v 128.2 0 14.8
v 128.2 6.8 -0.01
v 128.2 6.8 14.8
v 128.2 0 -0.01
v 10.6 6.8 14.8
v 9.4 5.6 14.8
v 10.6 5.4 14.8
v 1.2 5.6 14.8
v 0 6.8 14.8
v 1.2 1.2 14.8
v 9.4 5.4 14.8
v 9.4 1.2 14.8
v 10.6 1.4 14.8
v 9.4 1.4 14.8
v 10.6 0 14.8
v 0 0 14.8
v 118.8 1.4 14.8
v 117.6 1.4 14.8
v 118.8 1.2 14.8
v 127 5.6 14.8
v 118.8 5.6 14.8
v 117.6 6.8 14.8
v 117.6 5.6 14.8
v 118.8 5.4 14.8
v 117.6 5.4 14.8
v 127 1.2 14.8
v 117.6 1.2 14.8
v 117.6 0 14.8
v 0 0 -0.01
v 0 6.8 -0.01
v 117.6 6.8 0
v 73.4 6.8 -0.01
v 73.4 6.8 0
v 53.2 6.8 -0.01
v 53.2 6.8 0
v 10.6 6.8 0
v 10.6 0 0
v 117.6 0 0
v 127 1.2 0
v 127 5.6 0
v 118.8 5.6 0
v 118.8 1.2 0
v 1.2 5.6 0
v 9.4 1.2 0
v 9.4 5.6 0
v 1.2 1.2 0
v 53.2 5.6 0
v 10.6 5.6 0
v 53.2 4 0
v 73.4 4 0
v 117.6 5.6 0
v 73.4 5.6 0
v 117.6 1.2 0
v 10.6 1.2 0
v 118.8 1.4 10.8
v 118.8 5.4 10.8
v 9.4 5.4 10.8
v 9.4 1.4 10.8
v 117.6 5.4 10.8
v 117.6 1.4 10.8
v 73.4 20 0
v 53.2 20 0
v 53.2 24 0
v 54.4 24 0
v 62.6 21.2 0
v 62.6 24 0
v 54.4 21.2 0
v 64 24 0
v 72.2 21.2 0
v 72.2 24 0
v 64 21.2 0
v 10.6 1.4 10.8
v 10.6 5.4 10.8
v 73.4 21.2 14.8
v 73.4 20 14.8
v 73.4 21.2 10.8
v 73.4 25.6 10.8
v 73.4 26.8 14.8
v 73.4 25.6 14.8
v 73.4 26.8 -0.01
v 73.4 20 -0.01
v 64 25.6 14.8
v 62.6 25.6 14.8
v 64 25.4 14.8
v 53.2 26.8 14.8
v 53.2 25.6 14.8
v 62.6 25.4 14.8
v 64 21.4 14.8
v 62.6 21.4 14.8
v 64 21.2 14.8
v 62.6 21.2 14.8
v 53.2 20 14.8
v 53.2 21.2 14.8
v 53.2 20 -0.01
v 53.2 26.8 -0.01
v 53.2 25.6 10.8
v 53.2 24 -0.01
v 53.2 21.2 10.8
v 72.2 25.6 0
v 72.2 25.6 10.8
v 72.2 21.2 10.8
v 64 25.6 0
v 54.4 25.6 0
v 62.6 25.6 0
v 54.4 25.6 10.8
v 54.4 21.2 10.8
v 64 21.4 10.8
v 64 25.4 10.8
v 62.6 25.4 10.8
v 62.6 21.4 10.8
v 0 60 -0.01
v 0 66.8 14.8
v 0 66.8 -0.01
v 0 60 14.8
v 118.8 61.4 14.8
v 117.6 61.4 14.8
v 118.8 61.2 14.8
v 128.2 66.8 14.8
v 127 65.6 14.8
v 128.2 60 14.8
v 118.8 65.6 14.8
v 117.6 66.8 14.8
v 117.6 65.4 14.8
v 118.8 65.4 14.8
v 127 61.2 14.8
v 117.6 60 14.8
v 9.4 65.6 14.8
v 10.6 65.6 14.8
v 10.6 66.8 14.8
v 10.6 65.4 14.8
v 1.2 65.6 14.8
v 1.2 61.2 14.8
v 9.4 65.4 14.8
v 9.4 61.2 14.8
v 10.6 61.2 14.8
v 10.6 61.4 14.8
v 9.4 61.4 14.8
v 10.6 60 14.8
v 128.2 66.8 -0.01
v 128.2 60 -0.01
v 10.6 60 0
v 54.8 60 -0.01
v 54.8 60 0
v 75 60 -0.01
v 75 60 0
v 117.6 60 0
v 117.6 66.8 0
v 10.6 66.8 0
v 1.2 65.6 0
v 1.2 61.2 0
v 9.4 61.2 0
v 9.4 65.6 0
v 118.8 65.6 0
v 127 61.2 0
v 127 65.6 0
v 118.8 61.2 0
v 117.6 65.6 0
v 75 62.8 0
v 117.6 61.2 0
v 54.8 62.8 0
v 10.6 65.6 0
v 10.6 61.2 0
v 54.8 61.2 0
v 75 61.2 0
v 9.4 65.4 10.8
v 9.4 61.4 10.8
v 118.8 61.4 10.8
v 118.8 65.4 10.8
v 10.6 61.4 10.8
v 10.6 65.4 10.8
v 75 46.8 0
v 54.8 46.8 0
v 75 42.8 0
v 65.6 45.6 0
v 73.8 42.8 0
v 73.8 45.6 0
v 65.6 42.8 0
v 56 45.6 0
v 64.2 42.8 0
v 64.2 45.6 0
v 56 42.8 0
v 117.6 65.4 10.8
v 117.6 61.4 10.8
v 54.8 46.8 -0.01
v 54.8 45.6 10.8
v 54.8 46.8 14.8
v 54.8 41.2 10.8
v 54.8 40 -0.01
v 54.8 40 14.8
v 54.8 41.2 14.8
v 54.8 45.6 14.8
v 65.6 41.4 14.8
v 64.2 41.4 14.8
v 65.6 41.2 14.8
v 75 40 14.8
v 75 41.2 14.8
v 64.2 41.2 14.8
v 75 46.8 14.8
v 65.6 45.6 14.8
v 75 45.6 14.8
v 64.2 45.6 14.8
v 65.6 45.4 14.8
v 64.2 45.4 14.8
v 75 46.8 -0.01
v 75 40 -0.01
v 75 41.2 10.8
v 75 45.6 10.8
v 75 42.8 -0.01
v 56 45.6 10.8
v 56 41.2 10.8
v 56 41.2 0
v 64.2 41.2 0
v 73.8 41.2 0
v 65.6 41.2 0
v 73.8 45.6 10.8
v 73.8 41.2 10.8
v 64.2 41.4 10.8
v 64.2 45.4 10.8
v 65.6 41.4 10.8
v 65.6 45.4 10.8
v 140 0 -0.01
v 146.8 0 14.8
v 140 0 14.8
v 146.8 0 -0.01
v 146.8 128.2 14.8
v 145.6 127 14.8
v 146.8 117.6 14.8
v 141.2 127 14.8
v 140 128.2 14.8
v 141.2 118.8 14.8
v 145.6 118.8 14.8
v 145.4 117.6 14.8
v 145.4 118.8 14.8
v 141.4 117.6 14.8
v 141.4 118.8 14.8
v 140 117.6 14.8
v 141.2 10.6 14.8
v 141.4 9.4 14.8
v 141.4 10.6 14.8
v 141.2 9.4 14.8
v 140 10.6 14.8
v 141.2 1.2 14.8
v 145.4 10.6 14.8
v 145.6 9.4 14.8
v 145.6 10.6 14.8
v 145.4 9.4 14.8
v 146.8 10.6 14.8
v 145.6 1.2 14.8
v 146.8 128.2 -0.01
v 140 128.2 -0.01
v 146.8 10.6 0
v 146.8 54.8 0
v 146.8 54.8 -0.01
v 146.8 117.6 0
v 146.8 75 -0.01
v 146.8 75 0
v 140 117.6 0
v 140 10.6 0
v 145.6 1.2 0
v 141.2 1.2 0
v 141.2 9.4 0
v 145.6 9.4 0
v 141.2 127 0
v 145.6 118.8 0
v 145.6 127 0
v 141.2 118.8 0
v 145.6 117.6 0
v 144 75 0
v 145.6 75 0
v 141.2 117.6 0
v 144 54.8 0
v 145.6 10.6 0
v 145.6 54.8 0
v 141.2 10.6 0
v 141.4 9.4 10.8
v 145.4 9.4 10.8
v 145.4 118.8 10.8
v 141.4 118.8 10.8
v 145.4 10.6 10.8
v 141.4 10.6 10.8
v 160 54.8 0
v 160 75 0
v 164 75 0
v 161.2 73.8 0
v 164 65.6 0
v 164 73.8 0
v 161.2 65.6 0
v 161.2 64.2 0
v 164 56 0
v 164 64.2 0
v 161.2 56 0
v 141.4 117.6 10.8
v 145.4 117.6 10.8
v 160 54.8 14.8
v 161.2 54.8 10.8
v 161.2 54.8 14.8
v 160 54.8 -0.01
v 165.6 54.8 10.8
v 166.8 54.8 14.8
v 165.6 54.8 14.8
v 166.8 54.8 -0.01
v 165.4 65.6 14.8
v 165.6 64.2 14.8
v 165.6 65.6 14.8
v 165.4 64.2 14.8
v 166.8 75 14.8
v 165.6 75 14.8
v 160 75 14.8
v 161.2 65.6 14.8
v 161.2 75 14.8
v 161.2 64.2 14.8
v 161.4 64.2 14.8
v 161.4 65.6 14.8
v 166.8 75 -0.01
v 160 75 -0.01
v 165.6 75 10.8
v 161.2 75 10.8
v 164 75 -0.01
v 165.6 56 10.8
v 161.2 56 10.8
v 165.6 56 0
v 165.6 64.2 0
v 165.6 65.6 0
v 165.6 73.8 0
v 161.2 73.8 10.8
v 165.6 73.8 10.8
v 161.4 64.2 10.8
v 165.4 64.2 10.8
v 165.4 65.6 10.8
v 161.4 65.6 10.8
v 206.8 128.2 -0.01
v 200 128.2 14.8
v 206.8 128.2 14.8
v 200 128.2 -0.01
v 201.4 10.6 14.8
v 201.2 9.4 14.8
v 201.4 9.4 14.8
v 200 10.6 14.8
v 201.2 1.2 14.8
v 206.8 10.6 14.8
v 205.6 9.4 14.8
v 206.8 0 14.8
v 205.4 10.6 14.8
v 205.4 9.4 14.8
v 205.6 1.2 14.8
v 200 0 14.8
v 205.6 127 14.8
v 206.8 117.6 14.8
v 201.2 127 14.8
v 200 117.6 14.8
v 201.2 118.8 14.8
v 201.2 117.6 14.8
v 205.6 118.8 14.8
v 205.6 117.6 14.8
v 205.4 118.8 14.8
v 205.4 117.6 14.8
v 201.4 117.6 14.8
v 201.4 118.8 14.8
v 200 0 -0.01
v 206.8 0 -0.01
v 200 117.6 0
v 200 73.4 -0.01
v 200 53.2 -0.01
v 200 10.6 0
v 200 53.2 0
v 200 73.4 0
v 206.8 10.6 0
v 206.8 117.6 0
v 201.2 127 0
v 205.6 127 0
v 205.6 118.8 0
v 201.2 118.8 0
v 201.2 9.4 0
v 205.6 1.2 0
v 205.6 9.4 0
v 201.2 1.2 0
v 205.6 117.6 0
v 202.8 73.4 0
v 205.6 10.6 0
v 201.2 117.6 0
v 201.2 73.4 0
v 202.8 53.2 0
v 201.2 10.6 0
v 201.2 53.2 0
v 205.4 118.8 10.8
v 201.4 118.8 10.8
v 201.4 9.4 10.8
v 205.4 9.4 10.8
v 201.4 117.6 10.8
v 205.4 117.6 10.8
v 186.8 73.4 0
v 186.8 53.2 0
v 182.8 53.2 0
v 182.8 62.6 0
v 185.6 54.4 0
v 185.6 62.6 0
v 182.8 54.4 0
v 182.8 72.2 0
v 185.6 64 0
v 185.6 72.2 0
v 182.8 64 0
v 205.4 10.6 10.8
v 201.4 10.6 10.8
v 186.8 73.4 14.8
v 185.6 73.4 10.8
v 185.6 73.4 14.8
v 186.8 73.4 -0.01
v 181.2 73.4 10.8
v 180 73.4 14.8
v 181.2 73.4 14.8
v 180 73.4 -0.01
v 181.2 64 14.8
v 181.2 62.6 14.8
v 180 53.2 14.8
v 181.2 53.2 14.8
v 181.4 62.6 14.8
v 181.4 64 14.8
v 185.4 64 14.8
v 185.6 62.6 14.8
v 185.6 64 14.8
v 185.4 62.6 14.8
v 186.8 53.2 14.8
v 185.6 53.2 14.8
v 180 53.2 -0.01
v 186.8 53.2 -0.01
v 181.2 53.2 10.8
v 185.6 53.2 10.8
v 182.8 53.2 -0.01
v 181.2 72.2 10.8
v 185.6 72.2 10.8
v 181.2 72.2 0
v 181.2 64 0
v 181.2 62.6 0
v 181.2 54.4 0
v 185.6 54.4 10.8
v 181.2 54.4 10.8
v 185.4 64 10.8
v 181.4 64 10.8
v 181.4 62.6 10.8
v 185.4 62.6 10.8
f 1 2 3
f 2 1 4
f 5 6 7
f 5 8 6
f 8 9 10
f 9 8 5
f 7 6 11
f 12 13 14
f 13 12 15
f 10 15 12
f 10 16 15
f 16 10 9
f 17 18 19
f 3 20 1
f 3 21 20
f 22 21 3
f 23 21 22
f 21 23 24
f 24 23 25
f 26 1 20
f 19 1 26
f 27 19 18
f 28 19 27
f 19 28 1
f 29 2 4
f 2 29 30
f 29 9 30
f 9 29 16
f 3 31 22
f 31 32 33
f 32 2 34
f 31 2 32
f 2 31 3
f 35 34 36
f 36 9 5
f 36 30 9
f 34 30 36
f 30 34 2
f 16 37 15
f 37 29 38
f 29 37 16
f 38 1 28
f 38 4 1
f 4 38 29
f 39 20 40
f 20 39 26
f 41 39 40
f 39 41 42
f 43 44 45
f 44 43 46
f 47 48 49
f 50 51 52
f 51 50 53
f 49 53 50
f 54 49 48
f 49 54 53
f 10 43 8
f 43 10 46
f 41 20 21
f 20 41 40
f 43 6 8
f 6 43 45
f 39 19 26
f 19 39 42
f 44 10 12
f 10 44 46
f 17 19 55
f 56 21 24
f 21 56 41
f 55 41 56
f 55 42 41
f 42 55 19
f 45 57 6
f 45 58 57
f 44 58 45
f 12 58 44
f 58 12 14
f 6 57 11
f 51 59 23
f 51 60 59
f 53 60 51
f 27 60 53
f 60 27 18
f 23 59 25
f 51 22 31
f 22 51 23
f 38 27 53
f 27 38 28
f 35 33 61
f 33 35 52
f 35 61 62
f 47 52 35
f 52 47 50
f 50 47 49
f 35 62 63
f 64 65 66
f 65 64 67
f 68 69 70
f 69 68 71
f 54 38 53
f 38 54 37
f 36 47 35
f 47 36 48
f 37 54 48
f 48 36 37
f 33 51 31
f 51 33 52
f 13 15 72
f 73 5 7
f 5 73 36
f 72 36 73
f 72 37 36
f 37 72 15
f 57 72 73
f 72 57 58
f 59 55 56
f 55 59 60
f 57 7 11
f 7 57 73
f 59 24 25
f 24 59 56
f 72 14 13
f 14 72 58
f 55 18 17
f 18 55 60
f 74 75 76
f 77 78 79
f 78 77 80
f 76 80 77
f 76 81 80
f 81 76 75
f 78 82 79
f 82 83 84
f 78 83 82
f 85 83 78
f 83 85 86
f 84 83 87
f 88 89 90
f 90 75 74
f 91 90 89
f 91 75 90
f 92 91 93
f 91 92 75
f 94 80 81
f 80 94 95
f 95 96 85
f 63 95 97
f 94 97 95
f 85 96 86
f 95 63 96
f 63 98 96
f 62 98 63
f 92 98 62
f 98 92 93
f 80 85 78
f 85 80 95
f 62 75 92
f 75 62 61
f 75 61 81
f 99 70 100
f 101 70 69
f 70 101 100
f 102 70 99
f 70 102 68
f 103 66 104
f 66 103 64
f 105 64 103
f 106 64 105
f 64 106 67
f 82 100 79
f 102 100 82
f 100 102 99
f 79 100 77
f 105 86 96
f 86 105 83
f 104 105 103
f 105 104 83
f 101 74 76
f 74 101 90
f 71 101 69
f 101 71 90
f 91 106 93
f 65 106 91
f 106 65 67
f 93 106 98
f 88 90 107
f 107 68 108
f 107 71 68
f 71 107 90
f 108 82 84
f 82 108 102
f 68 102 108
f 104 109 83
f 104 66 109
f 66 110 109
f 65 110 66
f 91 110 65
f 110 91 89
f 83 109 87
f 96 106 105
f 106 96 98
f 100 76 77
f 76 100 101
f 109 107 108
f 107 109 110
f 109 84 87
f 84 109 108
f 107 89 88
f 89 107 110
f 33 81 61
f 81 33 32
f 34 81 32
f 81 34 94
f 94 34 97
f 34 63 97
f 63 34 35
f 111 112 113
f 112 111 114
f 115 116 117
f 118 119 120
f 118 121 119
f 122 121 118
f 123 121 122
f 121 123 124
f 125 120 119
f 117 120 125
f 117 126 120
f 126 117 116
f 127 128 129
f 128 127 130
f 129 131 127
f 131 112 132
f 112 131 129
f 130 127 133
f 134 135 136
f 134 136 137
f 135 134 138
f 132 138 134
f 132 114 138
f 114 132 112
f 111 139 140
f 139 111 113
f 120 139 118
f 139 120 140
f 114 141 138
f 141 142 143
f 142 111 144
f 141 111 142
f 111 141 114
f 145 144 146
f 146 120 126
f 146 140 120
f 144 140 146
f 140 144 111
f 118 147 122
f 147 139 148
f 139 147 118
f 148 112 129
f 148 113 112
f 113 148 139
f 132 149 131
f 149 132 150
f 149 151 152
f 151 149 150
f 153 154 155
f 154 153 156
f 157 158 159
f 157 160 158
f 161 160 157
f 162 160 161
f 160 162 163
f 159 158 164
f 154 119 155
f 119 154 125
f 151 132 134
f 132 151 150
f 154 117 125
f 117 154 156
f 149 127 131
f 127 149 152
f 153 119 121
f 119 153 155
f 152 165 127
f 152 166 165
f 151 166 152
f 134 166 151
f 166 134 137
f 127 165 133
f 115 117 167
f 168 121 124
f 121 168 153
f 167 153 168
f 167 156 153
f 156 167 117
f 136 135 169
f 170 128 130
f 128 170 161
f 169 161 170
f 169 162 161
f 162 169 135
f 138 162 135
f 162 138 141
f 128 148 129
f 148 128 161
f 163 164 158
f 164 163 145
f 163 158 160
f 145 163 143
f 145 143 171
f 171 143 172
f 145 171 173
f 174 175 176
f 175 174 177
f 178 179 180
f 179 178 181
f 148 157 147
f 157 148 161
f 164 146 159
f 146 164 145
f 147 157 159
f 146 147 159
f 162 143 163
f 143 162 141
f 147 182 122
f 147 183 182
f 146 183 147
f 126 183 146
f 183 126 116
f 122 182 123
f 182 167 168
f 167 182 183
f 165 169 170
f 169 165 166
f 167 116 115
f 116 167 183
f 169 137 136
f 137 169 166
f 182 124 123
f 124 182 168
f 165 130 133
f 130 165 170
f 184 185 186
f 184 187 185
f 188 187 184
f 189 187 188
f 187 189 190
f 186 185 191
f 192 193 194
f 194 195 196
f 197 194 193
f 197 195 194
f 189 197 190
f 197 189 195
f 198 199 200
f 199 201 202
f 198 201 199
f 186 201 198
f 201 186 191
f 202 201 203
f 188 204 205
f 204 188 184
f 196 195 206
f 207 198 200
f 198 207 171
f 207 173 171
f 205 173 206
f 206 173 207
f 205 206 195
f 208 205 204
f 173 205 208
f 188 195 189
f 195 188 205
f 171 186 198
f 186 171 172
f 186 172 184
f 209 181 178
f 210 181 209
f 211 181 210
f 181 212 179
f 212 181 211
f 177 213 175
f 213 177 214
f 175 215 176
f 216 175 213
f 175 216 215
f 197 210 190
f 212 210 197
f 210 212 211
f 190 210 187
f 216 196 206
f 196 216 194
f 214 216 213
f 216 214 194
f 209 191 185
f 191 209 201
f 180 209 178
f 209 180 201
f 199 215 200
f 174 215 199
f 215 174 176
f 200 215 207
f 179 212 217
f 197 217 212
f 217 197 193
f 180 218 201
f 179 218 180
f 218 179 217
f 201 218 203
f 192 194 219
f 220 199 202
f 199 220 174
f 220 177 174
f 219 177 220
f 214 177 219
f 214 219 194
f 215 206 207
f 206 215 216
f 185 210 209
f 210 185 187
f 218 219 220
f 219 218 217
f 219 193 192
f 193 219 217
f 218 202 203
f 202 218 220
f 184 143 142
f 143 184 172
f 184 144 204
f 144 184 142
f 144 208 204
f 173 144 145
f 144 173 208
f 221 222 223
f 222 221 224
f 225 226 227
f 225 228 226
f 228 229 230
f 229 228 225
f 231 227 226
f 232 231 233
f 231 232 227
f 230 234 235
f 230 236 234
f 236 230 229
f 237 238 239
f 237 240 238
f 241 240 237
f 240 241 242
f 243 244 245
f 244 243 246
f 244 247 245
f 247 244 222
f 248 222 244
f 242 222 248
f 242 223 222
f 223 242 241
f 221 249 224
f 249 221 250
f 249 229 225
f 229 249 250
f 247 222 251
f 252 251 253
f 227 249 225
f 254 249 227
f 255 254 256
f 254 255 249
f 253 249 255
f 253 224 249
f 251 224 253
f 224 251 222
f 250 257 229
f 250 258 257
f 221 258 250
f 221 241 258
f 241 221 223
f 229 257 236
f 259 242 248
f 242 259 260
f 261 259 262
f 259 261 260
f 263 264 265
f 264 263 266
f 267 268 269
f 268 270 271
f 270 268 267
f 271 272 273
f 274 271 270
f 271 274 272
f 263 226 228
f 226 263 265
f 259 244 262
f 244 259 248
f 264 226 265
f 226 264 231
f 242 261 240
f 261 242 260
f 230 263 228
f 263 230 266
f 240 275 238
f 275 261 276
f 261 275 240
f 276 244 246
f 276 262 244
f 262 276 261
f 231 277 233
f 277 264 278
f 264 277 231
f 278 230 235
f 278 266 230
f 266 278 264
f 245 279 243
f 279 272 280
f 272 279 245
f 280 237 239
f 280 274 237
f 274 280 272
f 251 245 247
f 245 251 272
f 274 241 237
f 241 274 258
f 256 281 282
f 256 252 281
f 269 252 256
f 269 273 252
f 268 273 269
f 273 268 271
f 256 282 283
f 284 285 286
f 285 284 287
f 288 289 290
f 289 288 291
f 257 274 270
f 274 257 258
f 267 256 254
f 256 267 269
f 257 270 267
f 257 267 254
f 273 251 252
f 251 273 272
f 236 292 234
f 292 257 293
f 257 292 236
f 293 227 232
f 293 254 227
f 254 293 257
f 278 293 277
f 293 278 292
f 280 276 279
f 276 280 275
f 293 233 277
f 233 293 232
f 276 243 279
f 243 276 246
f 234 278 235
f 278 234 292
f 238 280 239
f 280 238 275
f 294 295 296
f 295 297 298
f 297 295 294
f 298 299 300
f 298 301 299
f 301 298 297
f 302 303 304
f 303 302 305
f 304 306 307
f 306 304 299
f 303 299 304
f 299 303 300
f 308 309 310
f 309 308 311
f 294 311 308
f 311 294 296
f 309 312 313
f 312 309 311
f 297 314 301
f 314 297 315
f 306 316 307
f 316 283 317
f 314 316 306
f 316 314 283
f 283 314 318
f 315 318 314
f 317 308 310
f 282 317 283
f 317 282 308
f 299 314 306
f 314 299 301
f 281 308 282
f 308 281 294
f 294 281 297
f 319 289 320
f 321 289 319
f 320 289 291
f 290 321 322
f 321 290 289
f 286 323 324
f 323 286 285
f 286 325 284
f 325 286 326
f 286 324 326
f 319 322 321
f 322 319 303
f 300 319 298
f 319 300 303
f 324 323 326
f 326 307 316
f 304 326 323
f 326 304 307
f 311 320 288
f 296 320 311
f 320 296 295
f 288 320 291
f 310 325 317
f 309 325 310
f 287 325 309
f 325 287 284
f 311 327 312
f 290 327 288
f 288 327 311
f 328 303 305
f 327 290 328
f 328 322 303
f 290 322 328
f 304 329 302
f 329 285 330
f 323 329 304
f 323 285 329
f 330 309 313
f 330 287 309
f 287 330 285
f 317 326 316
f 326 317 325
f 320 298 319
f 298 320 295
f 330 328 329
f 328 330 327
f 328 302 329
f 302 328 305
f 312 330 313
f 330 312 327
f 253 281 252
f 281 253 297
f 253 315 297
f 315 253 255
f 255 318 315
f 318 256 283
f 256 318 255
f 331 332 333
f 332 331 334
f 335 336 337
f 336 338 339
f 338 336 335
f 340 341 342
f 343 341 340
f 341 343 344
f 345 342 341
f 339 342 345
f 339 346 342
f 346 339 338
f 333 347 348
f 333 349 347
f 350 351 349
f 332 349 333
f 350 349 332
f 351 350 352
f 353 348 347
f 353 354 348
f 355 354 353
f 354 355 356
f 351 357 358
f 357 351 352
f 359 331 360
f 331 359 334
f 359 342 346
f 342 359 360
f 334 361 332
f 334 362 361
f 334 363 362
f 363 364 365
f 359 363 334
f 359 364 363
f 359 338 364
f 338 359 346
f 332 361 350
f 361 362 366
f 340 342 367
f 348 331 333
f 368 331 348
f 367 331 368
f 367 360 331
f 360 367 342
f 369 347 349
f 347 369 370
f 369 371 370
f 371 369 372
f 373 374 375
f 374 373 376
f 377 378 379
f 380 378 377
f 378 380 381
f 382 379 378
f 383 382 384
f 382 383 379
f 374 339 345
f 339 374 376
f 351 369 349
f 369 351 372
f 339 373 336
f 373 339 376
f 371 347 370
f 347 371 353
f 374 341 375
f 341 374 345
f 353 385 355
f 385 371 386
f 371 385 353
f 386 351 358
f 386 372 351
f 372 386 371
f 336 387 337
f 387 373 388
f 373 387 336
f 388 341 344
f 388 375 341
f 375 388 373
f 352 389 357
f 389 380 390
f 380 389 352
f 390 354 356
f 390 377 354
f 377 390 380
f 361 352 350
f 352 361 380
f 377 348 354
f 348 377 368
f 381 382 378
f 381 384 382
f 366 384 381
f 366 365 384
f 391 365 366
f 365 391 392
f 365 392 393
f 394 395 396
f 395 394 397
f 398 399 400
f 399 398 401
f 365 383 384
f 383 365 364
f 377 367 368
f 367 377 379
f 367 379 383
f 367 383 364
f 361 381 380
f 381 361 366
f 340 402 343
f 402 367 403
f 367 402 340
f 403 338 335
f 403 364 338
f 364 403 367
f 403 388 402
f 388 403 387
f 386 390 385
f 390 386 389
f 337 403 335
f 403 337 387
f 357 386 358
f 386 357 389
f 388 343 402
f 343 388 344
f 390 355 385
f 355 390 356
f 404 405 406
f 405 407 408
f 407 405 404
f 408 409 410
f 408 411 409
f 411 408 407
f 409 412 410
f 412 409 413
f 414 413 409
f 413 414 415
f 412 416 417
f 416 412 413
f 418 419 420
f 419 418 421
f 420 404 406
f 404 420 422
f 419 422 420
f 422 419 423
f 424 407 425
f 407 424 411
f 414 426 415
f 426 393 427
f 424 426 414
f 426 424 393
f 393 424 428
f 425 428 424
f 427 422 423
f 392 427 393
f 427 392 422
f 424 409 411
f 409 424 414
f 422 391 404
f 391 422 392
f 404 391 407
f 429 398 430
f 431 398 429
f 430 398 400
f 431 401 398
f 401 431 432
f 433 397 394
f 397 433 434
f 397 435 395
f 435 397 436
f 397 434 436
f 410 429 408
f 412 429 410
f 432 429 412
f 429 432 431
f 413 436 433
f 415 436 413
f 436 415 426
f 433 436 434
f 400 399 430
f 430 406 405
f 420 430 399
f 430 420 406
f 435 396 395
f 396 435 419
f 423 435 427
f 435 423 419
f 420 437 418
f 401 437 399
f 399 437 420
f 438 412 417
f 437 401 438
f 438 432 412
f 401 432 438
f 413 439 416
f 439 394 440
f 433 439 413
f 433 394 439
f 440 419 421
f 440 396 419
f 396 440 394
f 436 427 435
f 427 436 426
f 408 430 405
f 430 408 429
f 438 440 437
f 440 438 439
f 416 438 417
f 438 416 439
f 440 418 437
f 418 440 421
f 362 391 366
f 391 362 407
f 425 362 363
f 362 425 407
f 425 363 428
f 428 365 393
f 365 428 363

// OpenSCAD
// file: ../../Base/Boxes.scad
// Fischertechnik Box Foundation
// Pre-designed Boxes

use <Constants.scad>

include <PlacementOptions.scad>

box190Width = 190;
box190Depth = 130;
box130Width = 130;
box130Depth = 95;
boxUsageHeight = 33.9;
boxWallThickness = 2.4;
boxBaseThickness = 1.0;

// getBoxWallThickness()
// Gets the wall thickness of a Fischertechnik Box

function getBoxWallThickness() = boxWallThickness;

// Gets the usable height of a fischertechnik box
function getBoxUsageHeight() = boxUsageHeight;

// Gets the thickness of the Fischertechnik box base.
function getBoxBaseThickness() = boxBaseThickness;

// Gets the usable inner space of a Box 190 as an x/y-list
function getBox190Space() = [
    box190Width - 2*getBoxWallThickness(), 
    box190Depth - 2*getBoxWallThickness() ];

// Imports the Fischertechnik empty box 130x190 mm and places it at position 0,0
// 190x130 are the outer sizes, the inner space is slightly smaller. Use getBox190Space() to get the inner sizes.
// This module needs the STL file "Fischertechnik Box 130x190.stl" in the library path.
// The box is positioned that the usable inner space is at the 0,0,0 position. The

module Box190() {
    translate([-getBoxWallThickness(),-getBoxWallThickness(),-getBoxBaseThickness()])
        import("Fischertechnik Box 130x190.stl", convexity=3);
}

// Gets the usable inner space of a Box 130 as an x/y-list
function getBox130Space() = [
    box130Width - 2*getBoxWallThickness(), 
    box130Depth - 2*getBoxWallThickness() ];

// Imports the Fischertechnik empty box 95x130 mm and places it at position 0,0
// 190x130 are the outer sizes, the inner space is slightly smaller. Use getBox190Space() to get the inner sizes.
// This module needs the STL file "Fischertechnik Box 95x130.stl" in the library path.
// The box is positioned that the usable inner space is at the 0,0,0 position. The

module Box130() {
    translate([-getBoxWallThickness(),-getBoxWallThickness(),-getBoxBaseThickness()])
        import("Fischertechnik Box 95x130.stl", convexity=3);
}

// Creates a web at the specified box walls
// corner 0 = LowerLeft, 1 = UpperLeft, 2 = UpperRight, 3 = LowerRight
// side 0 = LeftOfCorner, 1 = RightOfCorner
// distance = Distance in mm from the corner
// box = inner width and depth of the box (default: Box 190)
// webWidth = length of the web (default is 3 mms)
// webThickness = thickness of the web (default is 1 mm)

module BoxWeb(corner, side, distance, box=getBox190Space(), webWidth=3, webThickness=1.0) {
    sink = getBoxWallThickness()/2;

    width = (corner % 2 == 0) ? 
            (side == LeftOfCorner ? webWidth : webThickness) :
            (side == LeftOfCorner ? webThickness : webWidth);

    depth = (corner % 2 == 0) ? 
            (side == RightOfCorner ? webWidth : webThickness) :
            (side == RightOfCorner ? webThickness : webWidth);
    
    xDiff = corner == LowerLeft ? 
                (side == LeftOfCorner ? -sink : distance) :
            (corner == UpperLeft ?                
                (side == LeftOfCorner ? distance : -sink) :
            (corner == UpperRight ?
                (side == LeftOfCorner ? box.x-webWidth+sink : box.x-distance-webThickness) :
                (side == LeftOfCorner ? box.x-distance-webThickness: box.x-webWidth+sink)));

    yDiff = corner == LowerLeft ? 
                (side == RightOfCorner ? -sink : distance) :
            (corner == UpperLeft ?
                (side == RightOfCorner ? box.y-distance : box.y-webWidth+sink) :
            (corner == UpperRight ?
                (side == RightOfCorner ? box.y-webWidth+sink : box.y-distance) :
                (side == RightOfCorner ? distance : -sink)));
    
    translate([xDiff, yDiff, -getExcess()])
        cube([width, depth, boxUsageHeight + 2*getExcess()]);
}
// file: ../../Base/Rotation.scad
// Fischertechnik Box Foundation
// Geometry Helpers Rotation

include <PlacementOptions.scad>

// getRotatedSpace(space, rotation=NoRotation)
// Rotates the space dependent on the specified rotation

function getRotatedSpace(space, rotation=NoRotation) = [
    (rotation == Rotate90 || rotation == Rotate270) ? space.y : space.x,
    (rotation == Rotate90 || rotation == Rotate270) ? space.x : space.y
];

// Rotates the given space around the fixed left lower corner
// space = the space the children needs as width/depth list [width,depth]
// rotation = 0 Rotate0 degrees, 1 Rotate90 degrees, 2 Rotate180 degrees, 3 Rotate270 degrees (equivalent to -90)

module RotateFix(space, rotation=Rotate0) {
    dy = (rotation == Rotate0 || rotation == Rotate270) ? 0 :
        (rotation == Rotate90) ? space.x :
        space.y;
    dx = (rotation < Rotate180) ? 0 :
        (rotation == Rotate180) ? space.x :
        space.y;
    
    translate([dx, dy, 0])
        rotate([0, 0, rotations[rotation]])
            children();
}
// file: ../../Base/Alignment.scad
// Fischertechnik Box Foundation
// Geometry Helpers Alignment

include <PlacementOptions.scad>

// getAlignedX(elementWidth, spaceWidth, align=AlignRight, offset=0)
// Gets the aligned X offset of an element with the given
// width in the given space.
// elementWidth = The width of the element to positon
// spaceWidth = The space where the element should be aligned
// align = 0 AlignLeft, 1 AlignCenter, 2 AlignRight
// offset = an optional offset from the aligned position. When
// aligned left or centered, then positive values are in X direction.
// When aligned right then positive values are in negative X direction.

function getAlignedX(elementWidth, spaceWidth, align=AlignRight, offset=0) =
    (align == AlignLeft) ?
        offset :
        ((align == AlignCenter) ?
        (spaceWidth - elementWidth)/2 + offset :
        spaceWidth - offset - elementWidth);

// getAlignedY(elementDepth, spaceDepth, align=AlignTop, offset=0)
// Gets the aligned Y offset of an element with the given
// depth in the given space.
// elementDepth = The depth of the element to positon
// spaceDepth = The space where the element should be aligned
// align = 0 AlignBottom, 1 AlignCenter, 2 AlignTop
// offset = an optional offset from the aligned position. When
// aligned bottom or centered, then positive values are in Y direction.
// When aligned top then positive values are in negative Y direction.

function getAlignedY(elementDepth, spaceDepth, align=AlignTop, offset=0) =
    (align == AlignBottom) ?
        offset :
        ((align == AlignCenter) ?
        (spaceDepth - elementDepth)/2 + offset :
        spaceDepth - offset - elementDepth);
// file: ../../Base/Constants.scad
// Fischertechnik Box Foundation
// Constants

// Constant values necessary for multiple elements

// Base constants
dividerThickness = 1.2;
excess = 0.01;
fragments = 90;
tolerance = 0.8;

// Gets the thickness of a divider 
function getDividerThickness() = dividerThickness;

// Gets the excess that is used to merge walls into each other
function getExcess() = excess;

// Gets amount of fragments of a cylinder
function getFragments() = fragments;

// Gets the inner tolerance of a frame to each side
function getTolerance() = tolerance;


// Fischertechnik specific constants
axisDiameter = 4;
axisBottomDiameter = axisDiameter + 1;
standardEdgeDistance = 2.5;
standardWebDistance = 11.5;
standardCornerLength = 15;
tubeWallFactor = 1.6;

// Gets axis diameter
function getAxisDiameter() = axisDiameter;

// Gets axis bottom diameter for thicker part at the bottom
function getAxisBottomDiameter() = axisBottomDiameter;

// gets the standard distance to the wall of the box for dockable frames with webs
function getStandardEdgeDistance() = standardEdgeDistance;

// gets the standard distance of each web to the corner of the dockable frame
function getStandardWebDistance() = standardWebDistance;

// gets the standard length of the corner walls of a dockable frame
function getStandardCornerLength() = standardCornerLength;

// gets the wall thickness of a tube.
function getTubeWallThickness() = tubeWallFactor * getDividerThickness();
// file: ../../Base/PlacementOptions.scad
// Fischertechnik Box Foundation
// Placement Options

// Alignment
NoAlign = 0;
AlignLeft = 1;
AlignBottom = 2;
AlignCenter = 3;
AlignRight = 4;
AlignTop = 5;

// Element rotation degree steps
rotations = [0, -90, -180, -270];

// Rotation
NoRotation = 0;
Rotate0 = 0;
Rotate90 = 1;
Rotate180 = 2;
Rotate270 = 3;

// Docking (seen from above)
NoDock = -1;
DockLeft = 0;
DockTop = 1;
DockRight = 2;
DockCorner = 2;
DockBottom = 3;

// Web corners
LowerLeft = 0;
UpperLeft = 1;
UpperRight = 2;
LowerRight = 3;

// Web position relative to corner
LeftOfCorner = 0;
RightOfCorner = 1;
// file: ../../Elements/FrameCrankedAxis.scad
// Fischertechnik Box Library
// Frame for single Cranked Axis
// 31080

use <../Base/Constants.scad>
use <../ModelBase/Simple.scad>
use <../ModelBase/Complex.scad>

length = 125;
holderOffset = 20;

// getFrameCrankedAxisSpace()
// Gets the space (.x, .y) the holder for the cranked axis needs

function getFrameCrankedAxisSpace() = [getFrameAxisSpace(length).x, holderOffset + getFrameAxisSpace(length).y];

// FrameCrankedAxis()
// Holder for a single cranked axis

module FrameCrankedAxis() {
    FrameAxis(length);
    
    holderLength = 17 + 2*getDividerThickness();
    xOffset = ((length + getTolerance()) - holderLength)/2;
    yOffset = getAxisDiameter();

    spaceWidth = holderLength + getTolerance();
    
    translate([xOffset, yOffset, 0]) {
        Space([spaceWidth, holderOffset]);
    }
    
    translate([xOffset, holderOffset, 0]) {
        FrameAxis(holderLength, true);
    }
}

// Tests
color("lightgray") {
FrameCrankedAxis();
}
// file: ../../Base/Placement.scad
// Fischertechnik Box Foundation
// Geometry Helpers Placement

use <Constants.scad>
use <Alignment.scad>
use <Rotation.scad>
use <Boxes.scad>

include <PlacementOptions.scad>

// Place(x=0, y=0, elementSpace=[0,0], alignX=AlignLeft, alignY=AlignBottom, rotation=Rotate0, boxSpace=getBox190Space())
// Places the child at the specified position
// y = Y-Position. This is a relative position when an X aligment is specified.
// x = X-Position. This is a relative position when an Y aligment is specified.
// elementSpace = space of the element to be placed [x,y]
// alignX = -1=NoAlign, 0 AlignLeft, 1 AlignCenter, 3 AlignRight (elementSpace and boxSpace required!)
// alignY = -1=NoAlign, 2 AlignBottom, 1 AlignCenter, 4 AlignTop (elementSpace and boxSpace required!)
// rotation = 0 Rotate0 0 degrees, 1 Rotate90 90 degrees, 
// 2 Rotate180 180 degrees, 3 Rotate270 270 degrees (equivalent to -90)
// boxSpace = Inner space of the box where the placement occurs [x,y] - default is Box 190x130 inner space

module Place(x=0, y=0, elementSpace=[0,0], 
  alignX=AlignLeft, alignY=AlignBottom, 
  rotation=NoRotation, boxSpace=getBox190Space()) {

    module Position(x, y, space, rotation=Rotate0) {
        translate([x, y, 0])
            RotateFix(space, rotation)
                children(0);
    }

    space = getRotatedSpace(elementSpace, rotation);
    alignedX = getAlignedX(space.x, boxSpace.x, alignX, x);
    alignedY = getAlignedY(space.y, boxSpace.y, alignY, y);
    Position(alignedX, alignedY, elementSpace, rotation)
        children(0);
}

// Center(space=getBox130Space(), elementSpace=[0,0])
// space = Space where the children is centered. For cylinder use centered=true and no elementSpace.
// elementSpace = space of the element to be centered [x,y]

module Center(space=getBox190Space(), elementSpace=[0,0]) {
    translate([(space.x - elementSpace.x) / 2, (space.y - elementSpace.y) / 2])
        children(0);
}

// CenterHorizontal(width=0, y=0, offset=0, space=getBox130Space())
// space = Space where the children is centered. For cylinder use centered=true and no elementSpace.
// elementSpace = space of the element to be centered [x,y]

module CenterHorizontal(width=0, y=0, offset=0, space=getBox190Space()) {
    translate([(space.x - width) / 2 + offset, y])
        children(0);
}

// CenterVertical(depth=0, x=0, offset=0, space=getBox130Space())
// space = Space where the children is centered. For cylinder use centered=true and no elementSpace.
// elementSpace = space of the element to be centered [x,y]

module CenterVerticalal(depth=0, x=0, offset=0, space=getBox190Space()) {
    translate([x, (space.y - depth) / 2 + offset])
        children(0);
}
// main file
// Fischertechnik Box Foundation
// Elements
// Test FrameCrankedAxis

use <../../Base/Placement.scad>
use <../../Elements/FrameCrankedAxis.scad>

include <../../Base/PlacementOptions.scad>

FrameCrankedAxis();

Place(0, 40, elementSpace=getFrameCrankedAxisSpace(), rotation=Rotate180)
    FrameCrankedAxis();

Place(140, 0, elementSpace=getFrameCrankedAxisSpace(), rotation=Rotate90)
    FrameCrankedAxis();

Place(180, 0, elementSpace=getFrameCrankedAxisSpace(), rotation=Rotate270)
    FrameCrankedAxis();
